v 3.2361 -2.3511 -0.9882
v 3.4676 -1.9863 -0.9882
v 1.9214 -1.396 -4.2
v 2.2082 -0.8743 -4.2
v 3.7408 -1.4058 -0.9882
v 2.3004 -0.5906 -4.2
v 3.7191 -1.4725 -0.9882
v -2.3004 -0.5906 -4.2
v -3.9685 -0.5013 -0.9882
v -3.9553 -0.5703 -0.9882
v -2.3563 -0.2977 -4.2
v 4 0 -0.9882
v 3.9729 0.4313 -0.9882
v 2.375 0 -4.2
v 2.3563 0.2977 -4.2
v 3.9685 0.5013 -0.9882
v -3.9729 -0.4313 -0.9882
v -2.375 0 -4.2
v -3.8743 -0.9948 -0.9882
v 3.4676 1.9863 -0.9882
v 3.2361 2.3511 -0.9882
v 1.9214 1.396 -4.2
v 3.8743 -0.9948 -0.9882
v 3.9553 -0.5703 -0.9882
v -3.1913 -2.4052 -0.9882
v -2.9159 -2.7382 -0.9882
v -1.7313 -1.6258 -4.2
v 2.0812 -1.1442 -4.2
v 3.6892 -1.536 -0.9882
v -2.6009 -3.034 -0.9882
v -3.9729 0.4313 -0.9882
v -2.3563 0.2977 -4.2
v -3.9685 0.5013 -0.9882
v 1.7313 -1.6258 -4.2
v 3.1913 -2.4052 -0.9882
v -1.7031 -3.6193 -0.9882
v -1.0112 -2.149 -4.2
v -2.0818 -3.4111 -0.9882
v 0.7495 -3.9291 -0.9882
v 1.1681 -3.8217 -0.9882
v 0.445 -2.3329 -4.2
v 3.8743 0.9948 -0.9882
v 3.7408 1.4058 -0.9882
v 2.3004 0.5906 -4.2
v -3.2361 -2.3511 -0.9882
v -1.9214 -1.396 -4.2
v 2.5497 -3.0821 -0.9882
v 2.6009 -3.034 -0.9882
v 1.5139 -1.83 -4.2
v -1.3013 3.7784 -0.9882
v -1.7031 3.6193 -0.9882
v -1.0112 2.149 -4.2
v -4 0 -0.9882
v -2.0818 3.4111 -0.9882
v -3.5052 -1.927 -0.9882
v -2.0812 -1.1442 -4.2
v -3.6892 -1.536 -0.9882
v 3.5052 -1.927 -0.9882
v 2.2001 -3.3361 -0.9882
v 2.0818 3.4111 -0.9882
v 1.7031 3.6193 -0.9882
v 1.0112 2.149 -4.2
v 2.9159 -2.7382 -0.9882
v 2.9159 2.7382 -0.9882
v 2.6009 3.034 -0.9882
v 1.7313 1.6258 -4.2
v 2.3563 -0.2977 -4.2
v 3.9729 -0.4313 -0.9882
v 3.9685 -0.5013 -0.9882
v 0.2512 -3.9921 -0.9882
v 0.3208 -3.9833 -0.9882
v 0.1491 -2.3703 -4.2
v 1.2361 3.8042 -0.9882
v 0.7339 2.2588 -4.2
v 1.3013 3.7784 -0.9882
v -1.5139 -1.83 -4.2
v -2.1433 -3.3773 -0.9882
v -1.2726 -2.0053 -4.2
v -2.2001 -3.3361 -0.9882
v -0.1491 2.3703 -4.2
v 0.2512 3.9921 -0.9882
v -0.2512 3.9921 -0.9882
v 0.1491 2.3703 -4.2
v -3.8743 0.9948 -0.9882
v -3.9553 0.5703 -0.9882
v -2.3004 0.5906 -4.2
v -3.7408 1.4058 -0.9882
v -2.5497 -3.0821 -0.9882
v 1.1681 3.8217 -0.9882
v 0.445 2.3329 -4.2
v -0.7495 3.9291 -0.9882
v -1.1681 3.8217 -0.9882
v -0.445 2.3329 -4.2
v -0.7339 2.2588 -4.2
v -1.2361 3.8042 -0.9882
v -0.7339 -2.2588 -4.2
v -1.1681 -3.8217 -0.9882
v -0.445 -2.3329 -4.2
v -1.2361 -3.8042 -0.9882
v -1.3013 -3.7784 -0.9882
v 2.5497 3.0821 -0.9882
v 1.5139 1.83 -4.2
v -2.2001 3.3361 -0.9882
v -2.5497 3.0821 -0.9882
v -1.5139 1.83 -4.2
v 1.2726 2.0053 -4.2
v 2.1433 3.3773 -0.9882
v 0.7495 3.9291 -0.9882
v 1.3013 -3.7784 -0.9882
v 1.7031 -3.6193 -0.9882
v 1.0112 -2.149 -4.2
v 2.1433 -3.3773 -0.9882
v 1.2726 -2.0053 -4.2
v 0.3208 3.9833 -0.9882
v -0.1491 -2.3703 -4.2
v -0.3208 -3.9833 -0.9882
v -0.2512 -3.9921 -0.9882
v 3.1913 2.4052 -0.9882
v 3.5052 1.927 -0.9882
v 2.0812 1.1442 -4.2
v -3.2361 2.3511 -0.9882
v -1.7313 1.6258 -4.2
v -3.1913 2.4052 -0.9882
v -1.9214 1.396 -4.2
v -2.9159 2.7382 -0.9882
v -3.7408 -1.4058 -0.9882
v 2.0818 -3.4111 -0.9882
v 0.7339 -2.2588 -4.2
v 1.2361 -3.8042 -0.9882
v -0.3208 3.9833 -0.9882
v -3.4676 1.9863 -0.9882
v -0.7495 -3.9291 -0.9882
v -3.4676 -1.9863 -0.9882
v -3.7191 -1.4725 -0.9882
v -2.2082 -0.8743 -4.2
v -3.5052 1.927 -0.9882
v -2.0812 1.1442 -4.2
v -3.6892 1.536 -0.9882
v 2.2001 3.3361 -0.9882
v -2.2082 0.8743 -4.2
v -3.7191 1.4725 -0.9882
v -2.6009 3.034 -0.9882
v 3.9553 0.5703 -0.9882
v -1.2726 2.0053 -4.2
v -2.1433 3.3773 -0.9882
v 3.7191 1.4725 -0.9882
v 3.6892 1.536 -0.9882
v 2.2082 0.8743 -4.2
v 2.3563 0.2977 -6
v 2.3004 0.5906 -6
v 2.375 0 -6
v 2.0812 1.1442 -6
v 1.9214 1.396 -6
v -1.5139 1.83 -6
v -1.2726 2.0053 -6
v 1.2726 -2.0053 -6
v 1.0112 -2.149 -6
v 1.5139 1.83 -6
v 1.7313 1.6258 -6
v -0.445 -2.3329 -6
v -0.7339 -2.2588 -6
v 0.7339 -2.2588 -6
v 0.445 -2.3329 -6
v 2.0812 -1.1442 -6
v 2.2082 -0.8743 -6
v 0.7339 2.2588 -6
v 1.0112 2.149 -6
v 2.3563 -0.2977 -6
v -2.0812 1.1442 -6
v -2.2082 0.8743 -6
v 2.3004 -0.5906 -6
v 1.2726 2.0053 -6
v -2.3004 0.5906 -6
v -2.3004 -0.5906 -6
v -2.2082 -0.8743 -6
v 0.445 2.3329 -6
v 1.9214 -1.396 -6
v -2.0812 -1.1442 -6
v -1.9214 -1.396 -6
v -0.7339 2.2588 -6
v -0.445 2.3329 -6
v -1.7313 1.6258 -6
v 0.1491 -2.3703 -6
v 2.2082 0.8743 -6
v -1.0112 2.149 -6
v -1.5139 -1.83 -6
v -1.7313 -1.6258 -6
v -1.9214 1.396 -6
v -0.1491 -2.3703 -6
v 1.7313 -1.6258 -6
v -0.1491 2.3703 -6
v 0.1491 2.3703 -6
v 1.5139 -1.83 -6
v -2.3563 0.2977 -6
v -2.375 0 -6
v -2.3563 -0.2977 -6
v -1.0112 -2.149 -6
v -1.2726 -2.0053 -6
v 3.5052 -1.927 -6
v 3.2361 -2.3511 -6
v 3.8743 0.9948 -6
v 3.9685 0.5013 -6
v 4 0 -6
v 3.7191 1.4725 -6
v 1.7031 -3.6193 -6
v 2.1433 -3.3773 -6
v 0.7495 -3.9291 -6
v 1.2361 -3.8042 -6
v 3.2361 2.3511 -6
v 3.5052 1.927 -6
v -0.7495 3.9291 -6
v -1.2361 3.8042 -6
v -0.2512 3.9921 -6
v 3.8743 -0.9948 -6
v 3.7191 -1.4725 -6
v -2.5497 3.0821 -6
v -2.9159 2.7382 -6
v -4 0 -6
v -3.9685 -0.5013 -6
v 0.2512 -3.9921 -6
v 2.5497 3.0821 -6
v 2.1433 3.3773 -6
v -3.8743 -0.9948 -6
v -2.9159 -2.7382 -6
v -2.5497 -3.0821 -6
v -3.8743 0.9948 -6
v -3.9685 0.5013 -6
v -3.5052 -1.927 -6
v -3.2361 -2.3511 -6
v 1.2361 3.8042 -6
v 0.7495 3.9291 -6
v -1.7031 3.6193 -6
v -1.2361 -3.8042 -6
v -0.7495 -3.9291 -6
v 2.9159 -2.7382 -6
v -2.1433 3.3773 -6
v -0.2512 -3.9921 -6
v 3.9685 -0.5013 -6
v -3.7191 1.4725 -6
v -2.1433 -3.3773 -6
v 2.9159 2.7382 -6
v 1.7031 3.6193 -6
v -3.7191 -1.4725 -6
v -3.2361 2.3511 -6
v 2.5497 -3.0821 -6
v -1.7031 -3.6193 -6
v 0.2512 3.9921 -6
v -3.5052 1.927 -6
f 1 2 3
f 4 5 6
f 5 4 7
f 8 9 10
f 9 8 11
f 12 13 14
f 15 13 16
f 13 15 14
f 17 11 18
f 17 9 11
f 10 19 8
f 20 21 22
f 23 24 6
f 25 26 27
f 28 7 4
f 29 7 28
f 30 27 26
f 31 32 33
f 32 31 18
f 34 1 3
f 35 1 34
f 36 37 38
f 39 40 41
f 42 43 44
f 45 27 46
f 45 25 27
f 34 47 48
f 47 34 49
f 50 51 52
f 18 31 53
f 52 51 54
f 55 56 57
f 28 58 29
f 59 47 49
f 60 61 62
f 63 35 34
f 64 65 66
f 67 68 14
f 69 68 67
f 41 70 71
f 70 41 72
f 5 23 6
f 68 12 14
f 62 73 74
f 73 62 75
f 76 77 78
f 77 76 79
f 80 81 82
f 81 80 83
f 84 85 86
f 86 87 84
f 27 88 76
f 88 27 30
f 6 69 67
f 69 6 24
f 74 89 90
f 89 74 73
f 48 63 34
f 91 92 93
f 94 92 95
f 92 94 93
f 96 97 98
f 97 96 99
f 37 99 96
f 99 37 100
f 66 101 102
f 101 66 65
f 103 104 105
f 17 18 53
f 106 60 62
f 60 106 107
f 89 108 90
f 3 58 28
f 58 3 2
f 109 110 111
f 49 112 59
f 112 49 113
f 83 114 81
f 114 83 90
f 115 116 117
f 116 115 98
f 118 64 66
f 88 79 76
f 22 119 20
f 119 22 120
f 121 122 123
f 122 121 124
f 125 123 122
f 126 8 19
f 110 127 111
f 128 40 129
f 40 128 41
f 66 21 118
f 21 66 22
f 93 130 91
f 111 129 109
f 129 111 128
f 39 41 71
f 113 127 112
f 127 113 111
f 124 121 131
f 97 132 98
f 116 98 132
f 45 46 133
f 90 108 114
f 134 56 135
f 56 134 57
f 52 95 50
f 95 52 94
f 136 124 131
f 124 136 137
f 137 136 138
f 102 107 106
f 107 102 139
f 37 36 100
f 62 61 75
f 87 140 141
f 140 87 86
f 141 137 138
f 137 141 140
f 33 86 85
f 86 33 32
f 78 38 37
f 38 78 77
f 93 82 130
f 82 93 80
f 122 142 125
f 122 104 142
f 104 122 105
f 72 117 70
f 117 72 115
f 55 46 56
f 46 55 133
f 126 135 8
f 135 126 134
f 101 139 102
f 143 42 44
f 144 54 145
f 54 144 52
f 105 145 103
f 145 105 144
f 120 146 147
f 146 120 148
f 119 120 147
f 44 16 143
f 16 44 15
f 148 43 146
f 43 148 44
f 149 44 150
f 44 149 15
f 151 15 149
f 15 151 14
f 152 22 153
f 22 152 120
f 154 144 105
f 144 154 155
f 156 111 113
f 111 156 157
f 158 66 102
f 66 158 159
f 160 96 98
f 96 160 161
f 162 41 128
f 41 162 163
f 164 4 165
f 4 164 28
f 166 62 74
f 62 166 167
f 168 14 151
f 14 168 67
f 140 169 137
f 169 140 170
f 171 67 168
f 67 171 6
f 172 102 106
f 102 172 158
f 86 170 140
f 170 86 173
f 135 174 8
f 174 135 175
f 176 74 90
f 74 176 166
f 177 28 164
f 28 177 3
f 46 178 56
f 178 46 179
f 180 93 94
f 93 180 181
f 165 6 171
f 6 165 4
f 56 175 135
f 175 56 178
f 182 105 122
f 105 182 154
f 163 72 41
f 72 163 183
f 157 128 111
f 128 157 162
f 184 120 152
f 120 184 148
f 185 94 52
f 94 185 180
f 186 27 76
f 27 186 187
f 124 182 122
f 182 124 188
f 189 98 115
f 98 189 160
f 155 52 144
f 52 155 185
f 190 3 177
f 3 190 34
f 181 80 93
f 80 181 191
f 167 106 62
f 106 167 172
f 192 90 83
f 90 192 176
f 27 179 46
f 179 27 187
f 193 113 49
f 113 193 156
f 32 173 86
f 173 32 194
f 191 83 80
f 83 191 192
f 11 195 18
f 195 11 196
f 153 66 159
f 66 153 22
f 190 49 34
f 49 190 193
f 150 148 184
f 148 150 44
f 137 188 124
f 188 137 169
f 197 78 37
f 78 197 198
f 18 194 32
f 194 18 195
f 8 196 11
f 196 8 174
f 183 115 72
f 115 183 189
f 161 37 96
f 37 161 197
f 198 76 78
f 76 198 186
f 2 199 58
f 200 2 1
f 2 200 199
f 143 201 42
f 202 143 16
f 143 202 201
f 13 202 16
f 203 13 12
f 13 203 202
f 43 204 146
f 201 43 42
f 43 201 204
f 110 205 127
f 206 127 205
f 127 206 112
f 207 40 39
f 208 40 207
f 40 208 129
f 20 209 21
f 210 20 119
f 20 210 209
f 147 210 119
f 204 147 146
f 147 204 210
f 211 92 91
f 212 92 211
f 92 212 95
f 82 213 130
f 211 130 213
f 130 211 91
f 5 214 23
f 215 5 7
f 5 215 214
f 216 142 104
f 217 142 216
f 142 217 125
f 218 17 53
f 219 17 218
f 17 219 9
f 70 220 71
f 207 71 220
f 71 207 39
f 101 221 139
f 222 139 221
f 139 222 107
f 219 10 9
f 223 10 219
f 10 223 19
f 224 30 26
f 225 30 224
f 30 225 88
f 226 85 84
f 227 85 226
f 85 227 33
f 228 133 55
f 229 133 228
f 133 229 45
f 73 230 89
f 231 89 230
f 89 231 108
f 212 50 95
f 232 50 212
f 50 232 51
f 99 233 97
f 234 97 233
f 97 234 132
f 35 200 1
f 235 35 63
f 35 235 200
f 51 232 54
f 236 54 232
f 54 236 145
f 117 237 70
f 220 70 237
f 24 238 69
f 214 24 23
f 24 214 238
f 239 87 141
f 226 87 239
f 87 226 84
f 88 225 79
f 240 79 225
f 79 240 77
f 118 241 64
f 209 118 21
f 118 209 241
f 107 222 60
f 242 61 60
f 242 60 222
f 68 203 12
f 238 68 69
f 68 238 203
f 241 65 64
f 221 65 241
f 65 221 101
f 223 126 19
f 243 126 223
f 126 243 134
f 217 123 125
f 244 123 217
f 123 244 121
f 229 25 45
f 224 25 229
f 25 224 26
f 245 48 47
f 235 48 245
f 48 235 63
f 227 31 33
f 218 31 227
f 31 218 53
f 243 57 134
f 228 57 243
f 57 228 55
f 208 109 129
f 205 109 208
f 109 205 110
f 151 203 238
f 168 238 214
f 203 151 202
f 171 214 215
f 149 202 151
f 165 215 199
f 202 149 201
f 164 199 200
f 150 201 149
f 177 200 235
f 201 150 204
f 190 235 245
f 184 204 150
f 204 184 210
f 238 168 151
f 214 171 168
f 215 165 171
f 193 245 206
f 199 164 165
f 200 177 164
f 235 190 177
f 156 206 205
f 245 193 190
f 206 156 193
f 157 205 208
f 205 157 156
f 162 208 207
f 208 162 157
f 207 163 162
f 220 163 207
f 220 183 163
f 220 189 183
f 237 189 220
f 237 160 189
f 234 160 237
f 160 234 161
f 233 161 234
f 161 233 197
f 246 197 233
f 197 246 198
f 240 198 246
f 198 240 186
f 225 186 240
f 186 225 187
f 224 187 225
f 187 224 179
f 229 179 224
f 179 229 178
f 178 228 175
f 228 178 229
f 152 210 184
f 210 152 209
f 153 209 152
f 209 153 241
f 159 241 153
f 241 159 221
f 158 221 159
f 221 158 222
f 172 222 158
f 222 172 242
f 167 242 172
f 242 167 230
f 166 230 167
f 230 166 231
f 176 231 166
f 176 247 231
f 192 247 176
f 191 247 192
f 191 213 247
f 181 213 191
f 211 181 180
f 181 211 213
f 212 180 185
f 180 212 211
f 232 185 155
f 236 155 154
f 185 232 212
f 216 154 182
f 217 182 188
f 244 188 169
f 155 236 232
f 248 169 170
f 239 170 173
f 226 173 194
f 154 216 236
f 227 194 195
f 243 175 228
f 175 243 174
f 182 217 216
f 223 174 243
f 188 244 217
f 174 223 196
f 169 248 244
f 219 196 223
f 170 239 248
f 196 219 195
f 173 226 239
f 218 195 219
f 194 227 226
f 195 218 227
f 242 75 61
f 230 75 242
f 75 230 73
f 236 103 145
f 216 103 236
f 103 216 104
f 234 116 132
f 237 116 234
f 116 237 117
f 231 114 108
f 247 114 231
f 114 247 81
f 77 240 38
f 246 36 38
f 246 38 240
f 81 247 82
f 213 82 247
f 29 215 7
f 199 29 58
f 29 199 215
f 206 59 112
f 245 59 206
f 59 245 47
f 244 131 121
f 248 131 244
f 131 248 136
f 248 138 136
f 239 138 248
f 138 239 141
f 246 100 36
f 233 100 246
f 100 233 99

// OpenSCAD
$fn = 50;

difference() {
	union() {
		translate(v = [0, 0, -6.0]) {
			cylinder(h = 6, r = 4.0);
		}
	}
	union() {
		translate(v = [0, 0, 0]) {
			rotate(a = [0, 0, 0]) {
				difference() {
					union() {
						translate(v = [0, 0, -9.0]) {
							cylinder(h = 9, r = 2.25);
						}
						translate(v = [0, 0, -4.2]) {
							cylinder(h = 4.2, r1 = 2.375, r2 = 4.5);
						}
						translate(v = [0, 0, -9.0]) {
							cylinder(h = 9, r = 2.375);
						}
						translate(v = [0, 0, -9.0]) {
							cylinder(h = 9, r = 2.25);
						}
					}
					union();
				}
			}
		}
	}
}
